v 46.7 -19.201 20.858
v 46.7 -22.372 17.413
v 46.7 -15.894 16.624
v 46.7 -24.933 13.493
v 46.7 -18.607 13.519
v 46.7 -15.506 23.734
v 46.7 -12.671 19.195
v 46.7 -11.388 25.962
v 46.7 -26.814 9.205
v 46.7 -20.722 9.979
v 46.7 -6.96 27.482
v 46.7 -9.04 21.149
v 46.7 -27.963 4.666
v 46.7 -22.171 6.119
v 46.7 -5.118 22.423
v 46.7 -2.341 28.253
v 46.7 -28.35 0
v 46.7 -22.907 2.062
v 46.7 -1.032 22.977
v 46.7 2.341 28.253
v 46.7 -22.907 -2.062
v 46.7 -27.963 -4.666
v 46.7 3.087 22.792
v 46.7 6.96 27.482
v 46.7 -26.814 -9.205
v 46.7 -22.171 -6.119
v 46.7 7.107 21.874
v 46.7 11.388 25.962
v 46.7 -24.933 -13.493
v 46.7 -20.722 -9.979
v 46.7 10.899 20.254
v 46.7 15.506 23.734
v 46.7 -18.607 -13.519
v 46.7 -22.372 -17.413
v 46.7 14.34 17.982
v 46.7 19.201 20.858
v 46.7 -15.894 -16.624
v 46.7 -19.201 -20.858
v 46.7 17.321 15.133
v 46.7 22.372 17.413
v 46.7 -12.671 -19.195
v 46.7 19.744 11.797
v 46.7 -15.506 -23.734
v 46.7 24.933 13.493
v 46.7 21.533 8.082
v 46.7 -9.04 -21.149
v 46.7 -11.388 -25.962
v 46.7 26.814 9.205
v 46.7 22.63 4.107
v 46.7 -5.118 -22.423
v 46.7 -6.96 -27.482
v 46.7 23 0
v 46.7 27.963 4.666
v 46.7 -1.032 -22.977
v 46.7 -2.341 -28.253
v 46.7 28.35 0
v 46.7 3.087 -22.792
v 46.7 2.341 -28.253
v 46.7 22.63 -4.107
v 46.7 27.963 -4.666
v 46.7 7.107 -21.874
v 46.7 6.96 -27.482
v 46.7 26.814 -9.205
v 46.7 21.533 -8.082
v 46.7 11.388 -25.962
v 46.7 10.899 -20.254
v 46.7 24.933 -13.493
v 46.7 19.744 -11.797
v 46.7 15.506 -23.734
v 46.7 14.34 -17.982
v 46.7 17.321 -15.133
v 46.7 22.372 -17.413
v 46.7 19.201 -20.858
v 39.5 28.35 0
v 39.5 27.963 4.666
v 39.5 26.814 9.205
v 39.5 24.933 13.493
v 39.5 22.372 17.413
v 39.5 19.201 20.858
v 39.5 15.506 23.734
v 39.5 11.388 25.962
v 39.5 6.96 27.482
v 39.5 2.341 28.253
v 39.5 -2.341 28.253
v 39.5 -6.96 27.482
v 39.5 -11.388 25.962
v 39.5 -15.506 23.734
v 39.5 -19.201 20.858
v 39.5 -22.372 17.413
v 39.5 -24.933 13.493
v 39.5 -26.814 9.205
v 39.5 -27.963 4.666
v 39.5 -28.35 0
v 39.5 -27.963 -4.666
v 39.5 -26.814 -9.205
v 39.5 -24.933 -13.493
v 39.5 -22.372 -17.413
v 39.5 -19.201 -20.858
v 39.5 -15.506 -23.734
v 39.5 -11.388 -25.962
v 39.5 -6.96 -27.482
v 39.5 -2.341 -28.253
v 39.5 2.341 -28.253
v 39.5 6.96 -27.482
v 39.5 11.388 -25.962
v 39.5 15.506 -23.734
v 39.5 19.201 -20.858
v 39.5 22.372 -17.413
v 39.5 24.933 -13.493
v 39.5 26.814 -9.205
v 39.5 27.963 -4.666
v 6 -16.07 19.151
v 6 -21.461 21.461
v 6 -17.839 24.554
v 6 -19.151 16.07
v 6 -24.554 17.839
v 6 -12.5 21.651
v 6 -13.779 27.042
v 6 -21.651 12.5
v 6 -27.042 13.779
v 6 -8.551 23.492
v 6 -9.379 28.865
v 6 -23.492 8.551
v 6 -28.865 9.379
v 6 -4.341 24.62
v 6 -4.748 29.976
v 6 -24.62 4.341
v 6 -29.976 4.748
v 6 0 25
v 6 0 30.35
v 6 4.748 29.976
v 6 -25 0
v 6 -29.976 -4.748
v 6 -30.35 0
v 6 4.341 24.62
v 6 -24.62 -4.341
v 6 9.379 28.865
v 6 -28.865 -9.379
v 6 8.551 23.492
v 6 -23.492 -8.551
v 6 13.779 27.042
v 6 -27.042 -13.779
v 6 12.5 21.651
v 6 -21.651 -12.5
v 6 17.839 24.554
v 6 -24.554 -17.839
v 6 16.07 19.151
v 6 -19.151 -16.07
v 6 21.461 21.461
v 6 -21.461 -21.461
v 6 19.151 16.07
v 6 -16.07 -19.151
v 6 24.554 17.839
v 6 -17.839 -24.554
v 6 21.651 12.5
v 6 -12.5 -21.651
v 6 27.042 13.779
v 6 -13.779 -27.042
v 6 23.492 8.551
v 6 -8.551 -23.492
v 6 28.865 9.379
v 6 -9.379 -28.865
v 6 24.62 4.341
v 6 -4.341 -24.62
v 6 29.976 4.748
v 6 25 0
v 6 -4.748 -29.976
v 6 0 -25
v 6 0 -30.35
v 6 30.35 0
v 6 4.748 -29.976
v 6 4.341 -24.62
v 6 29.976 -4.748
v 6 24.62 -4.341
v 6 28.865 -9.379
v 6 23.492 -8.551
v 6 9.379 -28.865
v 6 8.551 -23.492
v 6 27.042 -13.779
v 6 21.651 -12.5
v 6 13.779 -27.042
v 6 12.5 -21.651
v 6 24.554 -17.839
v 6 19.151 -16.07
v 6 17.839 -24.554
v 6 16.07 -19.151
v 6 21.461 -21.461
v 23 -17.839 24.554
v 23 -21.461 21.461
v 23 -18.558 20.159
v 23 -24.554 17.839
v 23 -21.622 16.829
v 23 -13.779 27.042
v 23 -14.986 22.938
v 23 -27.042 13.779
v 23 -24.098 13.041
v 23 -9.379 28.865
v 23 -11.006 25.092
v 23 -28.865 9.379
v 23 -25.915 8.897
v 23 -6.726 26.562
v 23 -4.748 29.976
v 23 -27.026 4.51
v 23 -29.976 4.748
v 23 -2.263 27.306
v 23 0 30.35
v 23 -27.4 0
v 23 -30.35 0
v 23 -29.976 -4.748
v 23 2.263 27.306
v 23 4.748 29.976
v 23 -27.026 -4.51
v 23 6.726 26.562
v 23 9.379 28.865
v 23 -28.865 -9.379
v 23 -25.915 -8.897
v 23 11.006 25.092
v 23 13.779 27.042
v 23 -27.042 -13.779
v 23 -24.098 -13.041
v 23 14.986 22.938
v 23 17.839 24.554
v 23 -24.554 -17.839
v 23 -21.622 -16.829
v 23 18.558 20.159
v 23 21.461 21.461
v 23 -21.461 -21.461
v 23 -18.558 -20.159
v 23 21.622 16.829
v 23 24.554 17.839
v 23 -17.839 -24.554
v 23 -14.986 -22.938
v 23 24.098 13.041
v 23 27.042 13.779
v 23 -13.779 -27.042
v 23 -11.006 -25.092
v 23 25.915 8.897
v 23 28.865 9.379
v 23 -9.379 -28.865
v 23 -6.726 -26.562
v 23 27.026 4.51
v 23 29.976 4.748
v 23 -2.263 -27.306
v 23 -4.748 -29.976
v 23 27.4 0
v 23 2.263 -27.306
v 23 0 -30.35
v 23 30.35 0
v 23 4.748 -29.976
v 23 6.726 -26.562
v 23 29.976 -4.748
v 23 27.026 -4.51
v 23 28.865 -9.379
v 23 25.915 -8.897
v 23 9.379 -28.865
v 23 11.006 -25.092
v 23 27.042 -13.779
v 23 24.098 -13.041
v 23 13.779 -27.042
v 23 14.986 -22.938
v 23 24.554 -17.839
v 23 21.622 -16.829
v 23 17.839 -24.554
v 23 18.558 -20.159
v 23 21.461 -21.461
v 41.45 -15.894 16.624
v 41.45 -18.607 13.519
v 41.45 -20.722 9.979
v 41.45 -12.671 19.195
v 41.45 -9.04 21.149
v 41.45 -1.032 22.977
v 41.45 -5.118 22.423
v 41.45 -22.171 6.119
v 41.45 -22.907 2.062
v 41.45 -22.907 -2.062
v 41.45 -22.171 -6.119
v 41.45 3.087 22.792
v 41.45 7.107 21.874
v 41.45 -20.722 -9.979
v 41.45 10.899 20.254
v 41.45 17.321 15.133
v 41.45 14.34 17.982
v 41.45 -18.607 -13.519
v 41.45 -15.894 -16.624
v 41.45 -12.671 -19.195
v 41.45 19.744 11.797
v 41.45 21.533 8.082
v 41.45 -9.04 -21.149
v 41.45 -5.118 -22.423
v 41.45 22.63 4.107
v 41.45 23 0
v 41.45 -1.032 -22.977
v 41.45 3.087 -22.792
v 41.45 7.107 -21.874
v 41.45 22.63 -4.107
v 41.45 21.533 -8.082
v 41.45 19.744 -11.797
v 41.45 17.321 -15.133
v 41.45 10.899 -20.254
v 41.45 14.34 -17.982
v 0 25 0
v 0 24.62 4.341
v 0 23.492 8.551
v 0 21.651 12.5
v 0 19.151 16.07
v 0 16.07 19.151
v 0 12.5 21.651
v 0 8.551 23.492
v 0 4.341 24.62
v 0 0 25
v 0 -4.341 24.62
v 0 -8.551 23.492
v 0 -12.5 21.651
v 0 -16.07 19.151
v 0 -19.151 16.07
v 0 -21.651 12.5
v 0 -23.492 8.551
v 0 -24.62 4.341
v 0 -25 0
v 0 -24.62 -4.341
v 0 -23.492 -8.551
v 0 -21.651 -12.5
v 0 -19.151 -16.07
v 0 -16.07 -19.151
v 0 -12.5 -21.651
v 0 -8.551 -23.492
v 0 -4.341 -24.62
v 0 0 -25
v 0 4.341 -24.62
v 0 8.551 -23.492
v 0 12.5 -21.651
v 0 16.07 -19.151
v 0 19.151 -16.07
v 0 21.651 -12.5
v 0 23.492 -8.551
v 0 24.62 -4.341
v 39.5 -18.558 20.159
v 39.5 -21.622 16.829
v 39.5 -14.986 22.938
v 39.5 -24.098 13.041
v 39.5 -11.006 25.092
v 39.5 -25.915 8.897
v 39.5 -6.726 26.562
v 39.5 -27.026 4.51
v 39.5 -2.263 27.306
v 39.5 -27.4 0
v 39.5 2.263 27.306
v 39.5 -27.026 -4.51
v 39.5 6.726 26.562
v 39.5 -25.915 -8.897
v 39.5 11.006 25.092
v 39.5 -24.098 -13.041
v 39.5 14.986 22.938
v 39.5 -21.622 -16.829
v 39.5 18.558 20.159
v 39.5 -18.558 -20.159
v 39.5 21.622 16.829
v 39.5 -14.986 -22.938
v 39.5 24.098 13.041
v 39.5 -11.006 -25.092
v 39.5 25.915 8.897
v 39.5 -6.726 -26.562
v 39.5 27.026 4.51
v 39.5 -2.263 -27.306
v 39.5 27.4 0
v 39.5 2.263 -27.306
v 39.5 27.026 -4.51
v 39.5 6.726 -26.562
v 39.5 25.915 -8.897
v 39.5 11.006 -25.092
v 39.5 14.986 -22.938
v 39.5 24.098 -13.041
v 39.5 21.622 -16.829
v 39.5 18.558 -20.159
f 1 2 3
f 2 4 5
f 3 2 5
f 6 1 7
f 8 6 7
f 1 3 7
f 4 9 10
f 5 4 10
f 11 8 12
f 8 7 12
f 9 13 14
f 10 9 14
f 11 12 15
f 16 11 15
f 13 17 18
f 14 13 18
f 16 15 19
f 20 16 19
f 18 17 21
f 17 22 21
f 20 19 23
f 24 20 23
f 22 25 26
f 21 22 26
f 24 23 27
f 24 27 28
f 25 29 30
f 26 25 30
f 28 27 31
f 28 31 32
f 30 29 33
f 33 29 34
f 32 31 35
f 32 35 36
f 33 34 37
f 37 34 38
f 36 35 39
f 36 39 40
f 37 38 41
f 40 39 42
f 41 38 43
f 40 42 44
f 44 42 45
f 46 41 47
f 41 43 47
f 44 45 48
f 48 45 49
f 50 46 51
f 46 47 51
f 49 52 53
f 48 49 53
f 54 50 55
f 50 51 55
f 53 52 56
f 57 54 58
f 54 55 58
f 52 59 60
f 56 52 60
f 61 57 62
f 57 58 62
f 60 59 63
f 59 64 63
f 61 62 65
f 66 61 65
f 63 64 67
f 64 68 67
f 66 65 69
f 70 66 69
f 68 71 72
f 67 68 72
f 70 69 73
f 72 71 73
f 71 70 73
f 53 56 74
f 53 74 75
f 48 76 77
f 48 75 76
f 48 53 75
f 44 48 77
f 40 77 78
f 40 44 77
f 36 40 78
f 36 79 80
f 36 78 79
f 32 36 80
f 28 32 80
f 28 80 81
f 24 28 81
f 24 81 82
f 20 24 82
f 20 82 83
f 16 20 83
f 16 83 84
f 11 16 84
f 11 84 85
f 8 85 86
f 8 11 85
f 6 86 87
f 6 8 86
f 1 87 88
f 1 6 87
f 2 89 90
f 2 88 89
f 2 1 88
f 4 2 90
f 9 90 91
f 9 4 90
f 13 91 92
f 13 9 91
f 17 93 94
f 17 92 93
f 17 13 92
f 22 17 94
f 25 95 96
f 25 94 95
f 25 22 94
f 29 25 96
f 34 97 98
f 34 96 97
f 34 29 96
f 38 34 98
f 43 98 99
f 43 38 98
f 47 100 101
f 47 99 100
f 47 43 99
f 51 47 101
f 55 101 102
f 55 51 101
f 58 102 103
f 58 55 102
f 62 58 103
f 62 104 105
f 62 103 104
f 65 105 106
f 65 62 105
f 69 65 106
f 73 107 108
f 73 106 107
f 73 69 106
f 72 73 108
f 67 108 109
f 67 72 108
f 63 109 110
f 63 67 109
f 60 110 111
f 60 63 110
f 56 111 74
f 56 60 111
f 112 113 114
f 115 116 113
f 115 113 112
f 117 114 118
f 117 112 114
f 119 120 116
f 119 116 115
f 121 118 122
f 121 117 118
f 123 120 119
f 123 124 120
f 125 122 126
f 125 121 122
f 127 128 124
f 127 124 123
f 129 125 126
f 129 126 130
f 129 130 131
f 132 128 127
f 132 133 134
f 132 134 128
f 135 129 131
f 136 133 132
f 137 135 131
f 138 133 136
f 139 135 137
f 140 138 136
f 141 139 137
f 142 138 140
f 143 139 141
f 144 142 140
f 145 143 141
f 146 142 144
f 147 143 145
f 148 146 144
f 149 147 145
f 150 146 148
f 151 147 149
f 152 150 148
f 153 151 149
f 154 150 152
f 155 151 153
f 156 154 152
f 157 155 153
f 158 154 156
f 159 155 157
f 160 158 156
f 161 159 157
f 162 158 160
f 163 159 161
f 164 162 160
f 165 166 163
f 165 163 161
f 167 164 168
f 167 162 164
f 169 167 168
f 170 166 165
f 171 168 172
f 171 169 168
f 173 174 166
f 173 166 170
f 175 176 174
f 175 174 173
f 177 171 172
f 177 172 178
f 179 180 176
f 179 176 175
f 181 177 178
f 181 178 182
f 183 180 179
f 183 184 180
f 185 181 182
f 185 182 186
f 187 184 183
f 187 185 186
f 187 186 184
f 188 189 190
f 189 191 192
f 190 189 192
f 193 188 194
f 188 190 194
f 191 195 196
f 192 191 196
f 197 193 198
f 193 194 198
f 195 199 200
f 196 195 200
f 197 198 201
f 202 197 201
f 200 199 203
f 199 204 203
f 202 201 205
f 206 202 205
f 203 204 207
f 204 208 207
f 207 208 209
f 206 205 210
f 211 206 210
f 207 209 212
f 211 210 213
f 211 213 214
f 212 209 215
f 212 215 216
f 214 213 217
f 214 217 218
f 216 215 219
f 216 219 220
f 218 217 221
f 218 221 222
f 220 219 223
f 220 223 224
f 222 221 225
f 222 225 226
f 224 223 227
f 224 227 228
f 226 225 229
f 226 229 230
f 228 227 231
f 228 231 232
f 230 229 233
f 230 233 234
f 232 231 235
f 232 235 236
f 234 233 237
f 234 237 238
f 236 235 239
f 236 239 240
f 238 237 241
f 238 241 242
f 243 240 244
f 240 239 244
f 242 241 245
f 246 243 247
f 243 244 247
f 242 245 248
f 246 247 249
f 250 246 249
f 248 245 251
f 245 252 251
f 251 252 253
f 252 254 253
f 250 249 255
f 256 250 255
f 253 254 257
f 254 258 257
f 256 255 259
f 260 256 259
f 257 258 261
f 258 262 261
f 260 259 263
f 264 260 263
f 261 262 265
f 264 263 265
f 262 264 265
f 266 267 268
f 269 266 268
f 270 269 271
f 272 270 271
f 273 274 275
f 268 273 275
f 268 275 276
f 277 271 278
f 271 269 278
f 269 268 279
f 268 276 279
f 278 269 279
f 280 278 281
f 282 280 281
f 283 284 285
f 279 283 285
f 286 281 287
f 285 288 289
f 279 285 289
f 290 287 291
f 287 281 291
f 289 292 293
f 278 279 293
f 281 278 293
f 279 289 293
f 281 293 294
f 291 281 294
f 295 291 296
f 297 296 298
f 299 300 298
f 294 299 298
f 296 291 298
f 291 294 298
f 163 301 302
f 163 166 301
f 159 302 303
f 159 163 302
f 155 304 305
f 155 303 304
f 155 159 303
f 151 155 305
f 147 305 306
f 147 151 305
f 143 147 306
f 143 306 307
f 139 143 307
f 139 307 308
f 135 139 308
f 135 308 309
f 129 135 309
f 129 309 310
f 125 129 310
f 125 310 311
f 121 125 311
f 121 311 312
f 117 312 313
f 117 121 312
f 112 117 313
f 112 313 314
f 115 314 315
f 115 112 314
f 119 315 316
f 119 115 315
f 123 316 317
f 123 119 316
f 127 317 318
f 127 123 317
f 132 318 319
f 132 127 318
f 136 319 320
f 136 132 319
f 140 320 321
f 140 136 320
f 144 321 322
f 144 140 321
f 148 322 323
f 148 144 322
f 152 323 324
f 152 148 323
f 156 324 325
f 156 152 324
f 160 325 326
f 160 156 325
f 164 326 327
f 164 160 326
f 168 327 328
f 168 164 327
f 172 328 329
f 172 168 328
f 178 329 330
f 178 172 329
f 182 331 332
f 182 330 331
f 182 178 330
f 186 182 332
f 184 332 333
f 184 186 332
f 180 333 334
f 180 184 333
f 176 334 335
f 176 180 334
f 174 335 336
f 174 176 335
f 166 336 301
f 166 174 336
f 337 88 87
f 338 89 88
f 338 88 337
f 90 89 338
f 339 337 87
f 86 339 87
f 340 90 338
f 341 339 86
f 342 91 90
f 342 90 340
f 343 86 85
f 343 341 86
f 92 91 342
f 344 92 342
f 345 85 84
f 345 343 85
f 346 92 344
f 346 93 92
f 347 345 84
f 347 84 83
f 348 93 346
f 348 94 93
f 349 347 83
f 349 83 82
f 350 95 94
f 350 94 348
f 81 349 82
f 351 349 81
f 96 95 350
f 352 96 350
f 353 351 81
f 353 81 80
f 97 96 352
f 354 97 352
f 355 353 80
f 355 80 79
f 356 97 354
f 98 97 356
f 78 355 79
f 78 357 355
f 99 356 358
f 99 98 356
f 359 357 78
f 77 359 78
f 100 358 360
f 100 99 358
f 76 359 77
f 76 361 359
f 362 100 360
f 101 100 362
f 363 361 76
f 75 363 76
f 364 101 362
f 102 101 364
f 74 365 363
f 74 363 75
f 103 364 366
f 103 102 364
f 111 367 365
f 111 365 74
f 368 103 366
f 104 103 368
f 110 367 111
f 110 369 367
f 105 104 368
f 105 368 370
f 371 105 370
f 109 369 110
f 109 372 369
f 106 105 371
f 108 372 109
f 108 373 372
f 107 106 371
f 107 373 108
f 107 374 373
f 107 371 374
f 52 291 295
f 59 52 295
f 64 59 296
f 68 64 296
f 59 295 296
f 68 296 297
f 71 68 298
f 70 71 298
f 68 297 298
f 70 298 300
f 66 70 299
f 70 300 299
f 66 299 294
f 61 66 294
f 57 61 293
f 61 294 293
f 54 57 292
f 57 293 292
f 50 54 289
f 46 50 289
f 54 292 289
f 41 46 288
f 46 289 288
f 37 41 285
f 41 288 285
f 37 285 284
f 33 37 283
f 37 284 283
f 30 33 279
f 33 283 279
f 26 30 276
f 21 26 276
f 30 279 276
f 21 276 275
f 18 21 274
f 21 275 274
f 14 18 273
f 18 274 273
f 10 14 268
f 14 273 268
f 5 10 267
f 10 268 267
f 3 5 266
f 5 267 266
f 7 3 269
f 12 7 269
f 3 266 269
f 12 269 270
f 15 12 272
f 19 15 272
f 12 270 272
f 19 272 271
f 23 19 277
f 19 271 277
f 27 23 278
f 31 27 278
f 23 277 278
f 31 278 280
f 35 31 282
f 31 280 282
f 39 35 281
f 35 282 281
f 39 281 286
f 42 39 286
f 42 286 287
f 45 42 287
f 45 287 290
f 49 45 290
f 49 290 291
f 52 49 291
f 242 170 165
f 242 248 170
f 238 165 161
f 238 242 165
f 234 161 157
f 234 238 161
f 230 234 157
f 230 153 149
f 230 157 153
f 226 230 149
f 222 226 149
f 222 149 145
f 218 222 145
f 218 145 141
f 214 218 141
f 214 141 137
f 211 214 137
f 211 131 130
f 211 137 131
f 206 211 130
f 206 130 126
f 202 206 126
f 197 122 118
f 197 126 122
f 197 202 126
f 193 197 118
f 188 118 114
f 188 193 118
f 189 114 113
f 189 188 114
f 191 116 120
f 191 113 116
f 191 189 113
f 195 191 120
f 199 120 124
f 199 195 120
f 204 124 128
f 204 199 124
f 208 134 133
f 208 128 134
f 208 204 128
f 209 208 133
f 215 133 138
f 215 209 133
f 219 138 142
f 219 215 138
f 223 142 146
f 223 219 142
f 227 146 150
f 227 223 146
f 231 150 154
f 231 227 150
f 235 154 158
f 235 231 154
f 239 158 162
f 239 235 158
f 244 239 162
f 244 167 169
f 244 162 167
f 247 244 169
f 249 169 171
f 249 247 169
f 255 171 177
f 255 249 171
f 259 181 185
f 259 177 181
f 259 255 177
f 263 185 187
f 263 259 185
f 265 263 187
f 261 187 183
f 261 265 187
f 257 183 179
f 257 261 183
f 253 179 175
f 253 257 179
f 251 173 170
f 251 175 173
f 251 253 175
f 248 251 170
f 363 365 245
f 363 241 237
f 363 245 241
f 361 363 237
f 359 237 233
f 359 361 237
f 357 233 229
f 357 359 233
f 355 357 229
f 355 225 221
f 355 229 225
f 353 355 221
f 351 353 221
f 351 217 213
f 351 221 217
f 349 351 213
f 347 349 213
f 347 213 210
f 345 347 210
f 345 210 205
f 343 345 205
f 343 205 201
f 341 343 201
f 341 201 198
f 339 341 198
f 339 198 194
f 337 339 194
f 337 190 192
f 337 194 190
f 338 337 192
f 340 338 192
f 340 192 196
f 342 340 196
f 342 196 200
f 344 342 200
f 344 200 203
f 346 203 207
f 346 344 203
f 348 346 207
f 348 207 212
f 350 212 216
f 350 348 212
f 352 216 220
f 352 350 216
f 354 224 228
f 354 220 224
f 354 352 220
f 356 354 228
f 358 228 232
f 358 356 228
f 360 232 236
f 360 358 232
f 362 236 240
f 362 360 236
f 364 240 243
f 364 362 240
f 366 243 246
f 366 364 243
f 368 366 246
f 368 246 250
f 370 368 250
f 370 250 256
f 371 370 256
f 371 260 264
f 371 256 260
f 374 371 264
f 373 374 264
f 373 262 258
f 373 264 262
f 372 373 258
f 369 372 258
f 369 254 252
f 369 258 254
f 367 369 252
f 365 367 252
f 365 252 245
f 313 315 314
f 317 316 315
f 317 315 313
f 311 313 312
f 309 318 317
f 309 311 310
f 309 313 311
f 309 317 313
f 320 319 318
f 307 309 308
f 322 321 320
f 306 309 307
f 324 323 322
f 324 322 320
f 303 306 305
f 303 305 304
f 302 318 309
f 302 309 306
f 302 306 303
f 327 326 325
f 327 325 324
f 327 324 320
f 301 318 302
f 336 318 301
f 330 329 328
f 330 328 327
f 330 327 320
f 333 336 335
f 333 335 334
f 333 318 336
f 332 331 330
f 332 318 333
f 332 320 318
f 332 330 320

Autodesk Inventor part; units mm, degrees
ref_plane "YZ Plane" through (0, 0, 0) normal (1, 0, 0) x (0, 1, 0)
ref_plane "XZ Plane" through (0, 0, 0) normal (0, 1, 0) x (-1, 0, 0)
ref_plane "XY Plane" through (0, 0, 0) normal (0, 0, 1) x (1, 0, 0)
sketch "Szkic1" plane through (0, 0, 0) normal (0, 0, 1) x (1, 0, 0)
  line L0 (0, 0) -> (0, 25)
  line L1 (0, 25) -> (6, 25)
  line L2 (6, 25) -> (6, 30.35)
  line L3 (6, 30.35) -> (23, 30.35)
  line L4 (23, 30.35) -> (23, 27.4)
  line L5 (23, 27.4) -> (39.5, 27.4)
  line L6 (39.5, 27.4) -> (39.5, 28.35)
  line L7 (39.5, 28.35) -> (46.7, 28.35)
  line L8 (46.7, 28.35) -> (46.7, 23)
  line L9 (46.7, 0) -> (0, 0)
  line L10 (46.7, 23) -> (41.45, 23)
  line L11 (41.45, 23) -> (41.45, 0)
  dimension "d0" = 25
  dimension "d1" = 6
  dimension "d3" = 30.35
  dimension "d4" = 17
  dimension "d5" = 27.4
  dimension "d6" = 16.5
  dimension "d7" = 7.2
  dimension "d8" = 28.35
  dimension "d10" = 5.25
  dimension "d11" = 23
revolve "Obrót1" add sketch "Szkic1" angle 360 about axis through (46.7, 0, 0) along (-1, 0, 0)
properties part number "obiektyw"
